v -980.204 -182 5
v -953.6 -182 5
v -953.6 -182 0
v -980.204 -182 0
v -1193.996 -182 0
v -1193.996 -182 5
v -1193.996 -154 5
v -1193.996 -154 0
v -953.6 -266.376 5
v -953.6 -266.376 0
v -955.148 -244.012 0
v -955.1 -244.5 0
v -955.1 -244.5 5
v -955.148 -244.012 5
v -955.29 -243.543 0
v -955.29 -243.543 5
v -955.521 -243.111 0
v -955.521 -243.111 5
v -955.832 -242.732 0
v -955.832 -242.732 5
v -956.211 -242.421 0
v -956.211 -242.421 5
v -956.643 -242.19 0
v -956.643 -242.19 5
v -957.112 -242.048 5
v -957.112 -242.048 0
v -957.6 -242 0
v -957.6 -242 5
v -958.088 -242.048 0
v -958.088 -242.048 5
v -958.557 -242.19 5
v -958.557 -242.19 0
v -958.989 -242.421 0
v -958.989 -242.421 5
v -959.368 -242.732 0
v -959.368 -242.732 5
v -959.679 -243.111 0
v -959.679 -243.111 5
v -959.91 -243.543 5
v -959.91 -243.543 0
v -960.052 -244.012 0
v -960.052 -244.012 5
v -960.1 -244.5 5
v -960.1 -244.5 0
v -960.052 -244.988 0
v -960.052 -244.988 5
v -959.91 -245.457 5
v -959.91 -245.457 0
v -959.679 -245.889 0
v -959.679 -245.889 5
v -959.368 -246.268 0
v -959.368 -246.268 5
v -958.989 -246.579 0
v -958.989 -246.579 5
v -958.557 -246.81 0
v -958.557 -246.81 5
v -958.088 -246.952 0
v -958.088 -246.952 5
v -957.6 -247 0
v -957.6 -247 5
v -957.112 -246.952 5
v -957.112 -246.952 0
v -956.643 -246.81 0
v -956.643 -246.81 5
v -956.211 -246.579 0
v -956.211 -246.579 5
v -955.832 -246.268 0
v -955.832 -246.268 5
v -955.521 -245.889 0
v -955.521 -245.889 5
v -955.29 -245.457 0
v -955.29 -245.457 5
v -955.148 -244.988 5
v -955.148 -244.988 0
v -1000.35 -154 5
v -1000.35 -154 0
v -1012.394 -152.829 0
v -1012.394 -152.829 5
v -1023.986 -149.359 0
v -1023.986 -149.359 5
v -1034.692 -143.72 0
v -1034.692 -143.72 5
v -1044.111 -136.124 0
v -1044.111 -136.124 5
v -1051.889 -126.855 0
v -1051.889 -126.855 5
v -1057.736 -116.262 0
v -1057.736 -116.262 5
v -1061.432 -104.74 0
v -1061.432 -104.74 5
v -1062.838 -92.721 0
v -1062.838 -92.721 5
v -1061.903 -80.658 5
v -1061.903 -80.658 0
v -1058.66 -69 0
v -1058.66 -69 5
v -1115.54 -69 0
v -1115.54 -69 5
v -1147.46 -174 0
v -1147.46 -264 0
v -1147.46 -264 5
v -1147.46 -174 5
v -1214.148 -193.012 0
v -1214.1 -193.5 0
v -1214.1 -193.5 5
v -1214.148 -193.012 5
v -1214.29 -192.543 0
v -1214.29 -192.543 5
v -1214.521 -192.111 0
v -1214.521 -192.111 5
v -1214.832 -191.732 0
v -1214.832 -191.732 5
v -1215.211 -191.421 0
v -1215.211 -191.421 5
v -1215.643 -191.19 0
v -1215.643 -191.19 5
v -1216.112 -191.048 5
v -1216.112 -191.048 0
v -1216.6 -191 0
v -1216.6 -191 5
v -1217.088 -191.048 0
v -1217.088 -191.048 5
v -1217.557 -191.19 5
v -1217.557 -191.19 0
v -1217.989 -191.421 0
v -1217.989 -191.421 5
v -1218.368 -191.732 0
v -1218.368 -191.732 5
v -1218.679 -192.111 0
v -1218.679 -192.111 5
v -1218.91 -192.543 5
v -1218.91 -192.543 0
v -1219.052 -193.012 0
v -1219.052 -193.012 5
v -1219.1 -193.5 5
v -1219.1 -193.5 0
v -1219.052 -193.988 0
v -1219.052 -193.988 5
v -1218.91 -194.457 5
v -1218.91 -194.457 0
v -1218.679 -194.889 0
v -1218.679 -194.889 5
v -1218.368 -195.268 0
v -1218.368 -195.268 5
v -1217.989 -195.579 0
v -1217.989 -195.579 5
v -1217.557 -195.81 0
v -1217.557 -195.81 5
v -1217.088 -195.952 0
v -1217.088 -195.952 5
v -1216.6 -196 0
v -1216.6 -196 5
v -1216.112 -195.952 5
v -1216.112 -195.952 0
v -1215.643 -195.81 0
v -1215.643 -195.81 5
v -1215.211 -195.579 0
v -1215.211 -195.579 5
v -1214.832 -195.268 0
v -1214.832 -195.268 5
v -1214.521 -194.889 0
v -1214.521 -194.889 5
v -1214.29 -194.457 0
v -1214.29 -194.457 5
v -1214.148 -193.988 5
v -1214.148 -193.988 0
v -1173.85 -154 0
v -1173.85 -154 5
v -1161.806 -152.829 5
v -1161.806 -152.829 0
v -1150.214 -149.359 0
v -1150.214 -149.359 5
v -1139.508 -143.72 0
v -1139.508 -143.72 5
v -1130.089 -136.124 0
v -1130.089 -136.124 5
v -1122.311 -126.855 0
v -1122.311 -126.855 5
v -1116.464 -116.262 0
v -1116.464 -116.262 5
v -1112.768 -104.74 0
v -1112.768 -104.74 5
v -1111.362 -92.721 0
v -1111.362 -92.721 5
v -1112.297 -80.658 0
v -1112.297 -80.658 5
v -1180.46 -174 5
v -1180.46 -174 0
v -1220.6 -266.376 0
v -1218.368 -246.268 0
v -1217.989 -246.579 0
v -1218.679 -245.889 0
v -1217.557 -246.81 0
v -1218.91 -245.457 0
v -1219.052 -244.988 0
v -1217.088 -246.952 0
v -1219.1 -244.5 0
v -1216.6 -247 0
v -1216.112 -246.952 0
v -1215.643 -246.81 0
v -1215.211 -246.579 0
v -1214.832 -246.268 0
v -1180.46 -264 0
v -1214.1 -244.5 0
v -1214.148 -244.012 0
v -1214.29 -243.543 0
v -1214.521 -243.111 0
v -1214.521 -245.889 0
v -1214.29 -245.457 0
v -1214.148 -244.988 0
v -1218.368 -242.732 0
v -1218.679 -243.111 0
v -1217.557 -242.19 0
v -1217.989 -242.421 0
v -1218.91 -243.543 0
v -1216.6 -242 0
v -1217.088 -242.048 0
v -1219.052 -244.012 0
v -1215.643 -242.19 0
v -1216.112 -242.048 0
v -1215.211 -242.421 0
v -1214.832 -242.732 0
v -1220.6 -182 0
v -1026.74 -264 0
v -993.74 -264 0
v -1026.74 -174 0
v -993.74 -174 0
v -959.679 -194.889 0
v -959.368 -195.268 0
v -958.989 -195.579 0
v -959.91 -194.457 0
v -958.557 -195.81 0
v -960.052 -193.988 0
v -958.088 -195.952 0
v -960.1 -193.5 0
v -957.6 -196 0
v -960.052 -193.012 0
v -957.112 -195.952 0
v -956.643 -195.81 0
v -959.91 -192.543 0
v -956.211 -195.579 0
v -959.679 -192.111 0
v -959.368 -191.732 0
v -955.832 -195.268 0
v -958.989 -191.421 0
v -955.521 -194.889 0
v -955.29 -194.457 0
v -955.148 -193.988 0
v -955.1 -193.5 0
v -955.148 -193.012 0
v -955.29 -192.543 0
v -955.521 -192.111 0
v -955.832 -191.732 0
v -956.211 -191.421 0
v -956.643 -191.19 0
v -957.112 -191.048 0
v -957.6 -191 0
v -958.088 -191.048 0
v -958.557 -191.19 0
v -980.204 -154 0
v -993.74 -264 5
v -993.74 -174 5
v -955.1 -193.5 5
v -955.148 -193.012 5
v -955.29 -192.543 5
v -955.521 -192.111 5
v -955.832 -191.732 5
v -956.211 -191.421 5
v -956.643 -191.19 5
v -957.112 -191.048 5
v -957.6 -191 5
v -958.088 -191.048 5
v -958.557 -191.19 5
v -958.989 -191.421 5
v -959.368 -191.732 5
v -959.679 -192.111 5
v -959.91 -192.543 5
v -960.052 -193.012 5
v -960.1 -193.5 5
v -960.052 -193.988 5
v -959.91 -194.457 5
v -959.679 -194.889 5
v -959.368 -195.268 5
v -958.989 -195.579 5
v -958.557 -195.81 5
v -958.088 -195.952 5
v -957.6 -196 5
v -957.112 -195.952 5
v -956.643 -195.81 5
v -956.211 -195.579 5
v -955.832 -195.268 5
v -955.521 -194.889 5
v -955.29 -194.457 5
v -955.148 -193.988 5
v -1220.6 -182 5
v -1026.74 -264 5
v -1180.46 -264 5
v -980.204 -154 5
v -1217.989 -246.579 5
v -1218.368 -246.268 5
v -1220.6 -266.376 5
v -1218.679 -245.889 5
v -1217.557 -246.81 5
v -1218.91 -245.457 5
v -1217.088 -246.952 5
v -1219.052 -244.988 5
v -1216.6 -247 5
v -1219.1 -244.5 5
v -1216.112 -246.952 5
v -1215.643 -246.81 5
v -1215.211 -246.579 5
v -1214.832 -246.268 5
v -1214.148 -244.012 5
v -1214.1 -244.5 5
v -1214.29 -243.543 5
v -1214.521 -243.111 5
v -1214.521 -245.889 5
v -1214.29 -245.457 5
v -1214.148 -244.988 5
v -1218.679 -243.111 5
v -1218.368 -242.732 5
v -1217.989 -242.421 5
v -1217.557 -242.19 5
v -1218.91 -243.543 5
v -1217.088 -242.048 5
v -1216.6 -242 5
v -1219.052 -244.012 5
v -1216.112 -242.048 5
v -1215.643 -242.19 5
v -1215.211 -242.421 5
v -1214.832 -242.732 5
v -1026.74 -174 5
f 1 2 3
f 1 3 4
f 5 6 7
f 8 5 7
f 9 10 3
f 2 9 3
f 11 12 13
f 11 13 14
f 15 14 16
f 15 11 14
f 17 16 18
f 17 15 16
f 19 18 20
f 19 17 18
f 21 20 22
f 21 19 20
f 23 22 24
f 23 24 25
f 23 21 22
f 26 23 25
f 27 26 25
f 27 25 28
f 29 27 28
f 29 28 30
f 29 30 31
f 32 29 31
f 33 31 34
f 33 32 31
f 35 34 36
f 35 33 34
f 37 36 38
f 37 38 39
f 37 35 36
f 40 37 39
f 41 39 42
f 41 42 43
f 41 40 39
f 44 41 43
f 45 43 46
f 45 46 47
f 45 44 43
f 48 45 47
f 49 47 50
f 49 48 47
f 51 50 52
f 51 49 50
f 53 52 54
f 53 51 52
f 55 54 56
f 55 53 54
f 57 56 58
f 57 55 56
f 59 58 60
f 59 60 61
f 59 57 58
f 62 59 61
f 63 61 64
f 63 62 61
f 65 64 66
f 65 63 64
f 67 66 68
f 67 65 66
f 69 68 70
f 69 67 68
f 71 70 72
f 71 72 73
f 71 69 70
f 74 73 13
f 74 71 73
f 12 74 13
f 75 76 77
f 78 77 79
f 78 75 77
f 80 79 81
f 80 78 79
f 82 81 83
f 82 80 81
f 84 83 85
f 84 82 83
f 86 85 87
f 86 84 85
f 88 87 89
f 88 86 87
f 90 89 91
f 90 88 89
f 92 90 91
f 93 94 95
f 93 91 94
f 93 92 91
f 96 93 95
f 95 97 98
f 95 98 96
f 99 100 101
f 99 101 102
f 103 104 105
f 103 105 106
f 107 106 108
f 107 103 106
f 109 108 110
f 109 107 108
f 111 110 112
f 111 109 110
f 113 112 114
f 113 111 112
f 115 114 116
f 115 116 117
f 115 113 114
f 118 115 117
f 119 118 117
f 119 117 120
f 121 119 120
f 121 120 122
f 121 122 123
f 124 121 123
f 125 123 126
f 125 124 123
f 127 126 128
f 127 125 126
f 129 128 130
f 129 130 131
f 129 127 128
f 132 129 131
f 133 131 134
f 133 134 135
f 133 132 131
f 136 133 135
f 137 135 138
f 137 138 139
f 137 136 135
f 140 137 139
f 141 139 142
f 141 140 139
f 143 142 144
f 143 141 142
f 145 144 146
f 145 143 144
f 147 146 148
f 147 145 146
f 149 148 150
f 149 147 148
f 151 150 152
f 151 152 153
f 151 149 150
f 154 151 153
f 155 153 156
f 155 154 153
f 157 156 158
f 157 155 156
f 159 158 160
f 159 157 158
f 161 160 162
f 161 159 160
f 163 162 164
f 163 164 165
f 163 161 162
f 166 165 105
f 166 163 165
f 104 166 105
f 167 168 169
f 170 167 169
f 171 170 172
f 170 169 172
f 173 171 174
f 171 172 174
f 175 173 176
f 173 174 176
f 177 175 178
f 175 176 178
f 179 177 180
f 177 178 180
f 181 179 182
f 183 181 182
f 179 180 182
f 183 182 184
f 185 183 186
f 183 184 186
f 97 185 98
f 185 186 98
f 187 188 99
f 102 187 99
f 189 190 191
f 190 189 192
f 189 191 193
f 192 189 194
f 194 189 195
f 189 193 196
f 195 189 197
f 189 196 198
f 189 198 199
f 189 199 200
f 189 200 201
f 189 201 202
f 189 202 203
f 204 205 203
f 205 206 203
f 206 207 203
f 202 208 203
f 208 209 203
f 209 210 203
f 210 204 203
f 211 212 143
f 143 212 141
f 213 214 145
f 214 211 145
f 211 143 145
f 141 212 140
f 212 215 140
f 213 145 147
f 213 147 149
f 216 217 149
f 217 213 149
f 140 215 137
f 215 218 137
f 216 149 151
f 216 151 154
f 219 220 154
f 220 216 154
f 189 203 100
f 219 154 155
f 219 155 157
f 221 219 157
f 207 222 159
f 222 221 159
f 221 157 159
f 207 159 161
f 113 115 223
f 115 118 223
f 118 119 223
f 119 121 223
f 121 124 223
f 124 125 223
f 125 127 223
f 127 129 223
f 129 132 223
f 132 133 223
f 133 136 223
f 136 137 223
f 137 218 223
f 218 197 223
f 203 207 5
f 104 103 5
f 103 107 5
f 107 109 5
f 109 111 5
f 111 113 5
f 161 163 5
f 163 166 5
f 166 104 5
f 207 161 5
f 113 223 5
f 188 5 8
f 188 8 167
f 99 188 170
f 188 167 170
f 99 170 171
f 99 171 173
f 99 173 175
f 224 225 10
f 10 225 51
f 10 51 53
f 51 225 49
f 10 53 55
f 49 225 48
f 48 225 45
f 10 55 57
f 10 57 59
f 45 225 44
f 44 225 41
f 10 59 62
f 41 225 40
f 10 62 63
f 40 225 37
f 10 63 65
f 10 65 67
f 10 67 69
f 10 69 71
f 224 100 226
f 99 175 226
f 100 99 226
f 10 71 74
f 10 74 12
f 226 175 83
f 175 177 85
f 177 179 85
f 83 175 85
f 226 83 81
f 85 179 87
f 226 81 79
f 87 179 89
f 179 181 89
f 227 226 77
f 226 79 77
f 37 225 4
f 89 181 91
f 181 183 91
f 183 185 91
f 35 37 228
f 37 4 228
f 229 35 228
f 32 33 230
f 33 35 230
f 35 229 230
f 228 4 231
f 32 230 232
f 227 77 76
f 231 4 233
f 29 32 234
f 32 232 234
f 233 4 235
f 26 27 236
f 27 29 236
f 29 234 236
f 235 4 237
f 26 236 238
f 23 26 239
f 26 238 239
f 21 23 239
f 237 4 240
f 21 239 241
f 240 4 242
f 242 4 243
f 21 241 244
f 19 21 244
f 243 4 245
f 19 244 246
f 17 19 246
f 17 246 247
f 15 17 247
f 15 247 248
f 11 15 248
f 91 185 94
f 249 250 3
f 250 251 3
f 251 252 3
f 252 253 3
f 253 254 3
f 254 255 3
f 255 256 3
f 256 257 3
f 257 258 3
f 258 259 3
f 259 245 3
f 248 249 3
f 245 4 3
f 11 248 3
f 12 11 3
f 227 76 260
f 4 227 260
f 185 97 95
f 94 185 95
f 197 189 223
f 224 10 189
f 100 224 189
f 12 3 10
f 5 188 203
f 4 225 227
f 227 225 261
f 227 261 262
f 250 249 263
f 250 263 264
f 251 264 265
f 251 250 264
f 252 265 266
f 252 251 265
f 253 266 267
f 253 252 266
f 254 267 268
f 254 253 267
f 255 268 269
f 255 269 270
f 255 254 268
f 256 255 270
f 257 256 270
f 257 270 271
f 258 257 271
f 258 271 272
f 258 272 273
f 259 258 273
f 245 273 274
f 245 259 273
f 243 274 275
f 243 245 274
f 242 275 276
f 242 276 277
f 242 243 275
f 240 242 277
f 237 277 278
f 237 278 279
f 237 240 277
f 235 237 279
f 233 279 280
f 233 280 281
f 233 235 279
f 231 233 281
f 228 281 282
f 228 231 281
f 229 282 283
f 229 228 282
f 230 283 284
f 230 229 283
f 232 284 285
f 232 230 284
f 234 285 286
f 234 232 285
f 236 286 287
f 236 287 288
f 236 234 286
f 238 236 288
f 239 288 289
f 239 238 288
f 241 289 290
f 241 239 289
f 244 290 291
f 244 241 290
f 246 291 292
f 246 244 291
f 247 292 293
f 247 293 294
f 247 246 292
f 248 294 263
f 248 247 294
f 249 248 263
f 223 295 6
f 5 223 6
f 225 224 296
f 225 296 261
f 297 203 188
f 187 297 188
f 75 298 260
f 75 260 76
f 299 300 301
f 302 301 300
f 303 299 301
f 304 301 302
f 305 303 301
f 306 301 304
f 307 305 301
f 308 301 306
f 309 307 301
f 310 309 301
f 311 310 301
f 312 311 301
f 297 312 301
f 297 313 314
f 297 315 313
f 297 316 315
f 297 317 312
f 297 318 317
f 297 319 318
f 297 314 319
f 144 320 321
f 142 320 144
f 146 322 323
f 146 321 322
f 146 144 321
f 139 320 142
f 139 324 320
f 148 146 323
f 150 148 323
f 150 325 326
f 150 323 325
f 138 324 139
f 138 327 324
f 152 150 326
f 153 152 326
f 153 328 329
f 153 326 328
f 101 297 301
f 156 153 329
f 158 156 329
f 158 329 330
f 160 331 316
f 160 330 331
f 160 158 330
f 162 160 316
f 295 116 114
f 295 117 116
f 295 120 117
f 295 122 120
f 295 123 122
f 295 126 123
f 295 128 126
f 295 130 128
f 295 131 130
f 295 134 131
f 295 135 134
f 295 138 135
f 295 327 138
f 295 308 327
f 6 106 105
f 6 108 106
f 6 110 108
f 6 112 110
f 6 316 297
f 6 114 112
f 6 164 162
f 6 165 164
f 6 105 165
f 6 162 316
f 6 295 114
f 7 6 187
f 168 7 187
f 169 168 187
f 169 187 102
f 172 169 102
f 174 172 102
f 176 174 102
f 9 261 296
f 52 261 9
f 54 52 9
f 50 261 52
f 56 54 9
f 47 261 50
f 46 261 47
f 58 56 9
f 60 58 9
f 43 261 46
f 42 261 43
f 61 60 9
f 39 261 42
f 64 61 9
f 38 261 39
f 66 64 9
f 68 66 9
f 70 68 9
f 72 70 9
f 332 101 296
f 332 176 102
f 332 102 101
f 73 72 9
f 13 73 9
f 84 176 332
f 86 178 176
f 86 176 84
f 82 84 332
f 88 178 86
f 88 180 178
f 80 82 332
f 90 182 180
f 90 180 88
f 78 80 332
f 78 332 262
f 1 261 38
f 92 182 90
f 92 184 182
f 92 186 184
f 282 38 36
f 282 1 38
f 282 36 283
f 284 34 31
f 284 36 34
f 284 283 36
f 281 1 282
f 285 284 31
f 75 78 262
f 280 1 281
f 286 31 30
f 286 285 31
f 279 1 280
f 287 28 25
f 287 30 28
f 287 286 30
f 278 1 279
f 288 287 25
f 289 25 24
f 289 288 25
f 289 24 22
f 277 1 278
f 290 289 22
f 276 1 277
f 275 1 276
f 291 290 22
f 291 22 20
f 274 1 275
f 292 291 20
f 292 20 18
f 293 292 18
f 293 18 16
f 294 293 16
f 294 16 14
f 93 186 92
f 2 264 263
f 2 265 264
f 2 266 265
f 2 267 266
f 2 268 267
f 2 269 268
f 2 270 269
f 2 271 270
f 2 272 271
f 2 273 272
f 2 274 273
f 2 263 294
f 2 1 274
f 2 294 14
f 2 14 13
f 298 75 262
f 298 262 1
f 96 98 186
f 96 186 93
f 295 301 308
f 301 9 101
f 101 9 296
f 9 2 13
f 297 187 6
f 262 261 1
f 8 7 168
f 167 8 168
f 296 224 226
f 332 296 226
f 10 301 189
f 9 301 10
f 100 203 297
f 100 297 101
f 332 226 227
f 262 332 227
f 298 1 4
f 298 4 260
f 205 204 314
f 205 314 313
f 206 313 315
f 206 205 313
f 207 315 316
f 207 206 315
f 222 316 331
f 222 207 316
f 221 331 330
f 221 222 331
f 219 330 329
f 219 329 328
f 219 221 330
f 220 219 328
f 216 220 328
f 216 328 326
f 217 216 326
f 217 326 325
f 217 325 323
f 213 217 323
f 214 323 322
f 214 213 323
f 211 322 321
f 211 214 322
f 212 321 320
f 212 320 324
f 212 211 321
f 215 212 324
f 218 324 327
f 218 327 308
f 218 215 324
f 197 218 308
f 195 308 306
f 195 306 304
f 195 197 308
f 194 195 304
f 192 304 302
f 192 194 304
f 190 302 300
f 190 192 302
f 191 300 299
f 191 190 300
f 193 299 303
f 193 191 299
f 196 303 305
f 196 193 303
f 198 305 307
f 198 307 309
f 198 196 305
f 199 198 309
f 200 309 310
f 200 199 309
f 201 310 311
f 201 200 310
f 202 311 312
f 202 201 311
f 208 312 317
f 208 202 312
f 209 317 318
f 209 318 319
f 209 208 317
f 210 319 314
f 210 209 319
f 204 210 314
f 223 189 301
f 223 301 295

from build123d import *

# Parameters (mm, degrees)
SKETCH1_W           = 267
SKETCH1_H           = 267.4
SKETCH1_R           = 2.5
SKETCH1_W_2         = 33
SKETCH1_H_2         = 90
BOSS_EXTRUDE1_DEPTH = 5
SKETCH6_W           = 267
SKETCH6_H           = 70.024397165
CUT_EXTRUDE4_DEPTH  = 6


with BuildPart() as part:
    # Sketch1 → Boss-Extrude1 (new body)
    with BuildSketch(Plane.XY):
        with Locations((-1087.1, -202.7)):
            Rectangle(SKETCH1_W, SKETCH1_H)
        with Locations((-957.6, -193.5)):
            Circle(SKETCH1_R, mode=Mode.SUBTRACT)
        with Locations((-957.6, -244.5)):
            Circle(SKETCH1_R, mode=Mode.SUBTRACT)
        with Locations((-1216.6, -244.5)):
            Circle(SKETCH1_R, mode=Mode.SUBTRACT)
        with Locations((-1216.6, -193.5)):
            Circle(SKETCH1_R, mode=Mode.SUBTRACT)
        with Locations((-1010.24, -219)):
            Rectangle(SKETCH1_W_2, SKETCH1_H_2, mode=Mode.SUBTRACT)
        with Locations((-1163.96, -219)):
            Rectangle(SKETCH1_W_2, SKETCH1_H_2, mode=Mode.SUBTRACT)
    extrude(amount=BOSS_EXTRUDE1_DEPTH)

    # Sketch6 → Cut-Extrude4 (cut, through all)
    with BuildSketch(Plane.XY.offset(5)):
        with BuildLine():
            Line((-1058.659911457, -69), (-953.6, -69))
            Line((-953.6, -69), (-953.6, -182))
            Line((-953.6, -182), (-980.204338358, -182))
            Line((-980.204338358, -182), (-980.204338358, -154))
            Line((-980.204338358, -154), (-1000.350392508, -154))
            ThreePointArc((-1000.350392508, -154), (-1051.889212828, -126.855339059), (-1058.659911457, -69))
        make_face()
        with Locations((-1087.1, -301.387801417)):
            Rectangle(SKETCH6_W, SKETCH6_H)
        with BuildLine():
            Line((-1115.540088543, -69), (-1220.6, -69))
            Line((-1220.6, -69), (-1220.6, -182))
            Line((-1220.6, -182), (-1193.995661642, -182))
            Line((-1193.995661642, -182), (-1193.995661642, -154))
            Line((-1193.995661642, -154), (-1173.849607492, -154))
            ThreePointArc((-1173.849607492, -154), (-1122.310787172, -126.855339059), (-1115.540088543, -69))
        make_face()
    extrude(amount=-CUT_EXTRUDE4_DEPTH, mode=Mode.SUBTRACT)


solid = part.part
